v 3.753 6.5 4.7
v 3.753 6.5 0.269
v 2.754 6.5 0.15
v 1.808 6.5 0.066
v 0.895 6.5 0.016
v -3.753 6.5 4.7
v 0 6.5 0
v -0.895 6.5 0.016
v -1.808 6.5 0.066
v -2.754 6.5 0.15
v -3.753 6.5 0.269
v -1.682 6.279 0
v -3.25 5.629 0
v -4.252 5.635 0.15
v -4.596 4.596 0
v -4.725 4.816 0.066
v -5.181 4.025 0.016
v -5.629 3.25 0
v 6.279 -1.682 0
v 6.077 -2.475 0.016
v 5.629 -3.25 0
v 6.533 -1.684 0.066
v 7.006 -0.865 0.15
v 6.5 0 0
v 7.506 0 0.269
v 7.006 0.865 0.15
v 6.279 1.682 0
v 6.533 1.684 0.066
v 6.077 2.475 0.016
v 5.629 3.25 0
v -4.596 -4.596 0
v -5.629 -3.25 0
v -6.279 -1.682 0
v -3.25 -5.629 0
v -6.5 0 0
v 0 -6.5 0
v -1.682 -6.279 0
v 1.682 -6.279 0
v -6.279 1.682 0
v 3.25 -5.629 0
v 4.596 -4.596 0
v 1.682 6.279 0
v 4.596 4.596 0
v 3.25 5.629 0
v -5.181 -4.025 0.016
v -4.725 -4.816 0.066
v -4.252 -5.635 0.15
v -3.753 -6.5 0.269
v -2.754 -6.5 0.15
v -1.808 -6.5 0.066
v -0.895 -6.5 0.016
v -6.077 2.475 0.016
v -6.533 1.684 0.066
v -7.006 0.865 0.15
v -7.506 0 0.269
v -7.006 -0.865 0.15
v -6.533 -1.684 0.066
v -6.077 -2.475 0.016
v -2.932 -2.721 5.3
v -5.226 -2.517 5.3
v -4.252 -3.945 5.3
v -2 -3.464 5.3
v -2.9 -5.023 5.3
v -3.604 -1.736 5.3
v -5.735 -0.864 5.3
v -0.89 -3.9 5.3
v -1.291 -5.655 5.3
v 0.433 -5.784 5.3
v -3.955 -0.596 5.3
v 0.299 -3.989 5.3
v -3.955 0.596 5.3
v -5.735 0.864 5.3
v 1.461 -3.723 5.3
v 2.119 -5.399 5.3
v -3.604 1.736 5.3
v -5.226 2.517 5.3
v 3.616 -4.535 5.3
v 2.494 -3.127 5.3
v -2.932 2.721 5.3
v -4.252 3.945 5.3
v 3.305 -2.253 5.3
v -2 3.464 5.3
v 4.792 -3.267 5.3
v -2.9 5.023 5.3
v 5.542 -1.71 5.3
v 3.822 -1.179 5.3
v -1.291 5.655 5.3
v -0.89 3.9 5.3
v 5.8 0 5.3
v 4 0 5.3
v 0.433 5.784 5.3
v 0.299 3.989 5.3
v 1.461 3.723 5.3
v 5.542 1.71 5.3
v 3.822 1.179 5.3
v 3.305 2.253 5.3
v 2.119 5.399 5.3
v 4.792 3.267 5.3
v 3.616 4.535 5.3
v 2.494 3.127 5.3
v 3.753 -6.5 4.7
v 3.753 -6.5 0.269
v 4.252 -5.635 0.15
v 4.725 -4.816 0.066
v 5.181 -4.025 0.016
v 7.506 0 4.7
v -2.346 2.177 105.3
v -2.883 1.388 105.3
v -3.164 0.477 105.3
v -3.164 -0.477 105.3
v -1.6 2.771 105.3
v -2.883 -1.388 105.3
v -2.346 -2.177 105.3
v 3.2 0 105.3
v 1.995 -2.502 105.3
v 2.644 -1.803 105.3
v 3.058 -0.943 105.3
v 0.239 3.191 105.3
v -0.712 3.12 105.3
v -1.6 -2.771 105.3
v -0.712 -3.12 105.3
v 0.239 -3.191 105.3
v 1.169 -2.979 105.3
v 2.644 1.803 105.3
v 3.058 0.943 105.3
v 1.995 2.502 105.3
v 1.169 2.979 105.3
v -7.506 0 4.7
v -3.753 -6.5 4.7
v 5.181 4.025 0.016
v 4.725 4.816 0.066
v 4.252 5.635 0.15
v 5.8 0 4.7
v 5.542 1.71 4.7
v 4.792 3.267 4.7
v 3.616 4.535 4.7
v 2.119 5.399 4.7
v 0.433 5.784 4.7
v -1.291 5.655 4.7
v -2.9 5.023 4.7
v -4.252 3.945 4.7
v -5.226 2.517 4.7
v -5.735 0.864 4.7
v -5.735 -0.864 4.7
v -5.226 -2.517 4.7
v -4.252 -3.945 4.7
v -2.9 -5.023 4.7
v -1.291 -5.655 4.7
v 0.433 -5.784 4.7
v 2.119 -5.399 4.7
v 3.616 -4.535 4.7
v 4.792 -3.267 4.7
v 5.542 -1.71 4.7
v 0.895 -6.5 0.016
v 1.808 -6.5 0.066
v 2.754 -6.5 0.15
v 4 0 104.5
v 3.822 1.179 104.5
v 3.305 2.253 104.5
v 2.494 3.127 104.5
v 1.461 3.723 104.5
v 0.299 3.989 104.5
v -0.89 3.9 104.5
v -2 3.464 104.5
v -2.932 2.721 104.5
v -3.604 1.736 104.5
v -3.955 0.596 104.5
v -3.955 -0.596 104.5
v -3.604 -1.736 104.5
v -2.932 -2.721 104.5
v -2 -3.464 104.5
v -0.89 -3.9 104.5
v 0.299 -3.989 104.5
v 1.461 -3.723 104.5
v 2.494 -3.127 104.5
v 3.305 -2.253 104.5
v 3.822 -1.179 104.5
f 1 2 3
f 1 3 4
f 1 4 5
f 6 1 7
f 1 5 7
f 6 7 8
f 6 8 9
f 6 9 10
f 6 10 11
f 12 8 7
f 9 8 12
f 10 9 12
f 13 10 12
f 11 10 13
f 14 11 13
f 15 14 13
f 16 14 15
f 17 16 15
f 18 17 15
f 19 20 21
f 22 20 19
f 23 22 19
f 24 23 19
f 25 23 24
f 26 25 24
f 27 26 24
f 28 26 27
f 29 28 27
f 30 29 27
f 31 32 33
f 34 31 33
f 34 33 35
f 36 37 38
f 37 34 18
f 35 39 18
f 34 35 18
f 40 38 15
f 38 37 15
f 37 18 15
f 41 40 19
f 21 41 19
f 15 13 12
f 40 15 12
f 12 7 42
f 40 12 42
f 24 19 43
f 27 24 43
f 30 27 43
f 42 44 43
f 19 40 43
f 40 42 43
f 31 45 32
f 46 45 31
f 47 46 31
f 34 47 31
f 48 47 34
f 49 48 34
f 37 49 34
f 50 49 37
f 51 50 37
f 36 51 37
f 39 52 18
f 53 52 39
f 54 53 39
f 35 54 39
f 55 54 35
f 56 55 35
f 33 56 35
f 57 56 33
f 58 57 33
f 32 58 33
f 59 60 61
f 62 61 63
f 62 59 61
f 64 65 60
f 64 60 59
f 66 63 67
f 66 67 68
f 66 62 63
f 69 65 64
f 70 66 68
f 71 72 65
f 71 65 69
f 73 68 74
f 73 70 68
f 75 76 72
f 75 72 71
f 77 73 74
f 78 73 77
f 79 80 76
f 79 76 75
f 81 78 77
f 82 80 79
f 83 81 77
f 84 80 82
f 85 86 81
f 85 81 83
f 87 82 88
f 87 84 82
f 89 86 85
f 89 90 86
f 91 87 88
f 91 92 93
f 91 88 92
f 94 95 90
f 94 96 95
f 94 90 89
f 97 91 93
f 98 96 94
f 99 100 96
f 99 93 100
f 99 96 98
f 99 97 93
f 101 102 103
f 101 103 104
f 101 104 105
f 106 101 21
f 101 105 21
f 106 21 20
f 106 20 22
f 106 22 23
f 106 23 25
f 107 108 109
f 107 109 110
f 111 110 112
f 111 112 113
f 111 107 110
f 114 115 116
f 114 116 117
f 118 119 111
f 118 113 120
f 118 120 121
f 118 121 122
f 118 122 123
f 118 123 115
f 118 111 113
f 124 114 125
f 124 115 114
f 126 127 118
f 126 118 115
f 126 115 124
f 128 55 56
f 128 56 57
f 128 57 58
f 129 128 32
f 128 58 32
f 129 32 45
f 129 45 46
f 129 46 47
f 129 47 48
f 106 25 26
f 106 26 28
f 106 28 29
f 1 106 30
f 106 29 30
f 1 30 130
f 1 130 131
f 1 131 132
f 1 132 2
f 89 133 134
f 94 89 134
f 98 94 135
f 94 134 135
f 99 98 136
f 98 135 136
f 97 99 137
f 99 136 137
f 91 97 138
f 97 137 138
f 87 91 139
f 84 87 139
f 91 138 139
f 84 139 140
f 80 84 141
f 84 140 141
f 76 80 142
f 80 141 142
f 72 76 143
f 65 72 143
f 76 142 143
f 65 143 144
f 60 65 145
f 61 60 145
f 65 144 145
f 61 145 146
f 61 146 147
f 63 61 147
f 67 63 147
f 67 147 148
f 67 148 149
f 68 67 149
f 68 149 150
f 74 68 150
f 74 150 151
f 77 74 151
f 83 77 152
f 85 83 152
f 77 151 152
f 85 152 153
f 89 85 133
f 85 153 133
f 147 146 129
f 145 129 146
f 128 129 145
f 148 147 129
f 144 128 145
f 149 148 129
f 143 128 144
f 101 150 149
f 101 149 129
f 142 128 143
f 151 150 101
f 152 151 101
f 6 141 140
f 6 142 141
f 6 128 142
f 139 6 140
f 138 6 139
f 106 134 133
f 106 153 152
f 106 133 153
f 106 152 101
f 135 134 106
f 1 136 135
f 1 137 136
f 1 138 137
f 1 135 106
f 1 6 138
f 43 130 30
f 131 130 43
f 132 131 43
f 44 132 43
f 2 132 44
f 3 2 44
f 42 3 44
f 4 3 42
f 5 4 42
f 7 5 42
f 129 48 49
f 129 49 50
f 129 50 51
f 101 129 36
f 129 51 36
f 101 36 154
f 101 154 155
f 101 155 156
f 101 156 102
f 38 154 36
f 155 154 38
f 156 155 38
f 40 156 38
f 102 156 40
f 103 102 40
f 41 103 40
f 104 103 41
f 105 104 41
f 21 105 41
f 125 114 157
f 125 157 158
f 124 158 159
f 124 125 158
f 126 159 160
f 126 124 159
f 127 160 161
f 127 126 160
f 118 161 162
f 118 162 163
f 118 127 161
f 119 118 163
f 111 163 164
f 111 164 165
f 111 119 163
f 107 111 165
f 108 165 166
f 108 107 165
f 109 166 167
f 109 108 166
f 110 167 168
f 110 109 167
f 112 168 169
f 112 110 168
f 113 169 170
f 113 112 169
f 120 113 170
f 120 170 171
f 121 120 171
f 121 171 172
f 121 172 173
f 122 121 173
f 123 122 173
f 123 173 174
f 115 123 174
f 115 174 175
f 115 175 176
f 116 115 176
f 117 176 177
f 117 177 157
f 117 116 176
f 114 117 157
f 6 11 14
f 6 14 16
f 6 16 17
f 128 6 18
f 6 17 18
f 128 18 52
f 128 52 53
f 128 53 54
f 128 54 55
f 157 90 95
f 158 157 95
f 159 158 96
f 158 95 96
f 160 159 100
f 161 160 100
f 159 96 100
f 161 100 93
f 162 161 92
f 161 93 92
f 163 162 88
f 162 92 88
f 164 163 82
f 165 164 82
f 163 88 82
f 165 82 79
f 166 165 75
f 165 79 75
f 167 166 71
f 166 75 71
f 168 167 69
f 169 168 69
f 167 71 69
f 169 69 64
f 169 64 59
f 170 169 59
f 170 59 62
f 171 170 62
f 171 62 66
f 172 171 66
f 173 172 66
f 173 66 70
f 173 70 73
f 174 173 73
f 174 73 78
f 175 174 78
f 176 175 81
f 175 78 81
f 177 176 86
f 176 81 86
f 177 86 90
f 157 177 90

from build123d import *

# Parameters (mm, degrees)
F1_DEPTH = 4.7
F4_R     = 5.8
F5_DEPTH = 0.6
F6_R     = 4
F7_DEPTH = 100
F8_SIZE  = 0.8


with BuildPart() as f1:
    # F0 (on Top) → F1 (new body)
    with BuildSketch(Plane.XY):
        Polygon((-3.7527767497, -6.5), (3.7527767497, -6.5), (7.5055534995, 0), (3.7527767497, 6.5), (-3.7527767497, 6.5), (-7.5055534995, 0), align=None)
    extrude(amount=F1_DEPTH)

    # F2 (on Front) → F3 (revolve, cut)
    with BuildSketch(Plane.XZ):
        Polygon((-7.5055534995, 0), (-6.5, 0), (-7.5055534995, 0.2694372481), align=None)
    revolve(axis=Axis((0, 0, 10.3672710247), (0, 0, 1)), mode=Mode.SUBTRACT)

    # F4 (on face) → F5 (join)
    with BuildSketch(Plane.XY.offset(4.7)):
        Circle(F4_R)
    extrude(amount=F5_DEPTH)

    # F6 (on face) → F7 (join)
    with BuildSketch(Plane.XY.offset(5.3)):
        Circle(F6_R)
    extrude(amount=F7_DEPTH)

    # F8
    f8_edges = [f1.edges().sort_by_distance(p)[0] for p in [
        (-4, 0, 105.3),
    ]]
    chamfer(f8_edges, length=F8_SIZE)


solid = f1.part
